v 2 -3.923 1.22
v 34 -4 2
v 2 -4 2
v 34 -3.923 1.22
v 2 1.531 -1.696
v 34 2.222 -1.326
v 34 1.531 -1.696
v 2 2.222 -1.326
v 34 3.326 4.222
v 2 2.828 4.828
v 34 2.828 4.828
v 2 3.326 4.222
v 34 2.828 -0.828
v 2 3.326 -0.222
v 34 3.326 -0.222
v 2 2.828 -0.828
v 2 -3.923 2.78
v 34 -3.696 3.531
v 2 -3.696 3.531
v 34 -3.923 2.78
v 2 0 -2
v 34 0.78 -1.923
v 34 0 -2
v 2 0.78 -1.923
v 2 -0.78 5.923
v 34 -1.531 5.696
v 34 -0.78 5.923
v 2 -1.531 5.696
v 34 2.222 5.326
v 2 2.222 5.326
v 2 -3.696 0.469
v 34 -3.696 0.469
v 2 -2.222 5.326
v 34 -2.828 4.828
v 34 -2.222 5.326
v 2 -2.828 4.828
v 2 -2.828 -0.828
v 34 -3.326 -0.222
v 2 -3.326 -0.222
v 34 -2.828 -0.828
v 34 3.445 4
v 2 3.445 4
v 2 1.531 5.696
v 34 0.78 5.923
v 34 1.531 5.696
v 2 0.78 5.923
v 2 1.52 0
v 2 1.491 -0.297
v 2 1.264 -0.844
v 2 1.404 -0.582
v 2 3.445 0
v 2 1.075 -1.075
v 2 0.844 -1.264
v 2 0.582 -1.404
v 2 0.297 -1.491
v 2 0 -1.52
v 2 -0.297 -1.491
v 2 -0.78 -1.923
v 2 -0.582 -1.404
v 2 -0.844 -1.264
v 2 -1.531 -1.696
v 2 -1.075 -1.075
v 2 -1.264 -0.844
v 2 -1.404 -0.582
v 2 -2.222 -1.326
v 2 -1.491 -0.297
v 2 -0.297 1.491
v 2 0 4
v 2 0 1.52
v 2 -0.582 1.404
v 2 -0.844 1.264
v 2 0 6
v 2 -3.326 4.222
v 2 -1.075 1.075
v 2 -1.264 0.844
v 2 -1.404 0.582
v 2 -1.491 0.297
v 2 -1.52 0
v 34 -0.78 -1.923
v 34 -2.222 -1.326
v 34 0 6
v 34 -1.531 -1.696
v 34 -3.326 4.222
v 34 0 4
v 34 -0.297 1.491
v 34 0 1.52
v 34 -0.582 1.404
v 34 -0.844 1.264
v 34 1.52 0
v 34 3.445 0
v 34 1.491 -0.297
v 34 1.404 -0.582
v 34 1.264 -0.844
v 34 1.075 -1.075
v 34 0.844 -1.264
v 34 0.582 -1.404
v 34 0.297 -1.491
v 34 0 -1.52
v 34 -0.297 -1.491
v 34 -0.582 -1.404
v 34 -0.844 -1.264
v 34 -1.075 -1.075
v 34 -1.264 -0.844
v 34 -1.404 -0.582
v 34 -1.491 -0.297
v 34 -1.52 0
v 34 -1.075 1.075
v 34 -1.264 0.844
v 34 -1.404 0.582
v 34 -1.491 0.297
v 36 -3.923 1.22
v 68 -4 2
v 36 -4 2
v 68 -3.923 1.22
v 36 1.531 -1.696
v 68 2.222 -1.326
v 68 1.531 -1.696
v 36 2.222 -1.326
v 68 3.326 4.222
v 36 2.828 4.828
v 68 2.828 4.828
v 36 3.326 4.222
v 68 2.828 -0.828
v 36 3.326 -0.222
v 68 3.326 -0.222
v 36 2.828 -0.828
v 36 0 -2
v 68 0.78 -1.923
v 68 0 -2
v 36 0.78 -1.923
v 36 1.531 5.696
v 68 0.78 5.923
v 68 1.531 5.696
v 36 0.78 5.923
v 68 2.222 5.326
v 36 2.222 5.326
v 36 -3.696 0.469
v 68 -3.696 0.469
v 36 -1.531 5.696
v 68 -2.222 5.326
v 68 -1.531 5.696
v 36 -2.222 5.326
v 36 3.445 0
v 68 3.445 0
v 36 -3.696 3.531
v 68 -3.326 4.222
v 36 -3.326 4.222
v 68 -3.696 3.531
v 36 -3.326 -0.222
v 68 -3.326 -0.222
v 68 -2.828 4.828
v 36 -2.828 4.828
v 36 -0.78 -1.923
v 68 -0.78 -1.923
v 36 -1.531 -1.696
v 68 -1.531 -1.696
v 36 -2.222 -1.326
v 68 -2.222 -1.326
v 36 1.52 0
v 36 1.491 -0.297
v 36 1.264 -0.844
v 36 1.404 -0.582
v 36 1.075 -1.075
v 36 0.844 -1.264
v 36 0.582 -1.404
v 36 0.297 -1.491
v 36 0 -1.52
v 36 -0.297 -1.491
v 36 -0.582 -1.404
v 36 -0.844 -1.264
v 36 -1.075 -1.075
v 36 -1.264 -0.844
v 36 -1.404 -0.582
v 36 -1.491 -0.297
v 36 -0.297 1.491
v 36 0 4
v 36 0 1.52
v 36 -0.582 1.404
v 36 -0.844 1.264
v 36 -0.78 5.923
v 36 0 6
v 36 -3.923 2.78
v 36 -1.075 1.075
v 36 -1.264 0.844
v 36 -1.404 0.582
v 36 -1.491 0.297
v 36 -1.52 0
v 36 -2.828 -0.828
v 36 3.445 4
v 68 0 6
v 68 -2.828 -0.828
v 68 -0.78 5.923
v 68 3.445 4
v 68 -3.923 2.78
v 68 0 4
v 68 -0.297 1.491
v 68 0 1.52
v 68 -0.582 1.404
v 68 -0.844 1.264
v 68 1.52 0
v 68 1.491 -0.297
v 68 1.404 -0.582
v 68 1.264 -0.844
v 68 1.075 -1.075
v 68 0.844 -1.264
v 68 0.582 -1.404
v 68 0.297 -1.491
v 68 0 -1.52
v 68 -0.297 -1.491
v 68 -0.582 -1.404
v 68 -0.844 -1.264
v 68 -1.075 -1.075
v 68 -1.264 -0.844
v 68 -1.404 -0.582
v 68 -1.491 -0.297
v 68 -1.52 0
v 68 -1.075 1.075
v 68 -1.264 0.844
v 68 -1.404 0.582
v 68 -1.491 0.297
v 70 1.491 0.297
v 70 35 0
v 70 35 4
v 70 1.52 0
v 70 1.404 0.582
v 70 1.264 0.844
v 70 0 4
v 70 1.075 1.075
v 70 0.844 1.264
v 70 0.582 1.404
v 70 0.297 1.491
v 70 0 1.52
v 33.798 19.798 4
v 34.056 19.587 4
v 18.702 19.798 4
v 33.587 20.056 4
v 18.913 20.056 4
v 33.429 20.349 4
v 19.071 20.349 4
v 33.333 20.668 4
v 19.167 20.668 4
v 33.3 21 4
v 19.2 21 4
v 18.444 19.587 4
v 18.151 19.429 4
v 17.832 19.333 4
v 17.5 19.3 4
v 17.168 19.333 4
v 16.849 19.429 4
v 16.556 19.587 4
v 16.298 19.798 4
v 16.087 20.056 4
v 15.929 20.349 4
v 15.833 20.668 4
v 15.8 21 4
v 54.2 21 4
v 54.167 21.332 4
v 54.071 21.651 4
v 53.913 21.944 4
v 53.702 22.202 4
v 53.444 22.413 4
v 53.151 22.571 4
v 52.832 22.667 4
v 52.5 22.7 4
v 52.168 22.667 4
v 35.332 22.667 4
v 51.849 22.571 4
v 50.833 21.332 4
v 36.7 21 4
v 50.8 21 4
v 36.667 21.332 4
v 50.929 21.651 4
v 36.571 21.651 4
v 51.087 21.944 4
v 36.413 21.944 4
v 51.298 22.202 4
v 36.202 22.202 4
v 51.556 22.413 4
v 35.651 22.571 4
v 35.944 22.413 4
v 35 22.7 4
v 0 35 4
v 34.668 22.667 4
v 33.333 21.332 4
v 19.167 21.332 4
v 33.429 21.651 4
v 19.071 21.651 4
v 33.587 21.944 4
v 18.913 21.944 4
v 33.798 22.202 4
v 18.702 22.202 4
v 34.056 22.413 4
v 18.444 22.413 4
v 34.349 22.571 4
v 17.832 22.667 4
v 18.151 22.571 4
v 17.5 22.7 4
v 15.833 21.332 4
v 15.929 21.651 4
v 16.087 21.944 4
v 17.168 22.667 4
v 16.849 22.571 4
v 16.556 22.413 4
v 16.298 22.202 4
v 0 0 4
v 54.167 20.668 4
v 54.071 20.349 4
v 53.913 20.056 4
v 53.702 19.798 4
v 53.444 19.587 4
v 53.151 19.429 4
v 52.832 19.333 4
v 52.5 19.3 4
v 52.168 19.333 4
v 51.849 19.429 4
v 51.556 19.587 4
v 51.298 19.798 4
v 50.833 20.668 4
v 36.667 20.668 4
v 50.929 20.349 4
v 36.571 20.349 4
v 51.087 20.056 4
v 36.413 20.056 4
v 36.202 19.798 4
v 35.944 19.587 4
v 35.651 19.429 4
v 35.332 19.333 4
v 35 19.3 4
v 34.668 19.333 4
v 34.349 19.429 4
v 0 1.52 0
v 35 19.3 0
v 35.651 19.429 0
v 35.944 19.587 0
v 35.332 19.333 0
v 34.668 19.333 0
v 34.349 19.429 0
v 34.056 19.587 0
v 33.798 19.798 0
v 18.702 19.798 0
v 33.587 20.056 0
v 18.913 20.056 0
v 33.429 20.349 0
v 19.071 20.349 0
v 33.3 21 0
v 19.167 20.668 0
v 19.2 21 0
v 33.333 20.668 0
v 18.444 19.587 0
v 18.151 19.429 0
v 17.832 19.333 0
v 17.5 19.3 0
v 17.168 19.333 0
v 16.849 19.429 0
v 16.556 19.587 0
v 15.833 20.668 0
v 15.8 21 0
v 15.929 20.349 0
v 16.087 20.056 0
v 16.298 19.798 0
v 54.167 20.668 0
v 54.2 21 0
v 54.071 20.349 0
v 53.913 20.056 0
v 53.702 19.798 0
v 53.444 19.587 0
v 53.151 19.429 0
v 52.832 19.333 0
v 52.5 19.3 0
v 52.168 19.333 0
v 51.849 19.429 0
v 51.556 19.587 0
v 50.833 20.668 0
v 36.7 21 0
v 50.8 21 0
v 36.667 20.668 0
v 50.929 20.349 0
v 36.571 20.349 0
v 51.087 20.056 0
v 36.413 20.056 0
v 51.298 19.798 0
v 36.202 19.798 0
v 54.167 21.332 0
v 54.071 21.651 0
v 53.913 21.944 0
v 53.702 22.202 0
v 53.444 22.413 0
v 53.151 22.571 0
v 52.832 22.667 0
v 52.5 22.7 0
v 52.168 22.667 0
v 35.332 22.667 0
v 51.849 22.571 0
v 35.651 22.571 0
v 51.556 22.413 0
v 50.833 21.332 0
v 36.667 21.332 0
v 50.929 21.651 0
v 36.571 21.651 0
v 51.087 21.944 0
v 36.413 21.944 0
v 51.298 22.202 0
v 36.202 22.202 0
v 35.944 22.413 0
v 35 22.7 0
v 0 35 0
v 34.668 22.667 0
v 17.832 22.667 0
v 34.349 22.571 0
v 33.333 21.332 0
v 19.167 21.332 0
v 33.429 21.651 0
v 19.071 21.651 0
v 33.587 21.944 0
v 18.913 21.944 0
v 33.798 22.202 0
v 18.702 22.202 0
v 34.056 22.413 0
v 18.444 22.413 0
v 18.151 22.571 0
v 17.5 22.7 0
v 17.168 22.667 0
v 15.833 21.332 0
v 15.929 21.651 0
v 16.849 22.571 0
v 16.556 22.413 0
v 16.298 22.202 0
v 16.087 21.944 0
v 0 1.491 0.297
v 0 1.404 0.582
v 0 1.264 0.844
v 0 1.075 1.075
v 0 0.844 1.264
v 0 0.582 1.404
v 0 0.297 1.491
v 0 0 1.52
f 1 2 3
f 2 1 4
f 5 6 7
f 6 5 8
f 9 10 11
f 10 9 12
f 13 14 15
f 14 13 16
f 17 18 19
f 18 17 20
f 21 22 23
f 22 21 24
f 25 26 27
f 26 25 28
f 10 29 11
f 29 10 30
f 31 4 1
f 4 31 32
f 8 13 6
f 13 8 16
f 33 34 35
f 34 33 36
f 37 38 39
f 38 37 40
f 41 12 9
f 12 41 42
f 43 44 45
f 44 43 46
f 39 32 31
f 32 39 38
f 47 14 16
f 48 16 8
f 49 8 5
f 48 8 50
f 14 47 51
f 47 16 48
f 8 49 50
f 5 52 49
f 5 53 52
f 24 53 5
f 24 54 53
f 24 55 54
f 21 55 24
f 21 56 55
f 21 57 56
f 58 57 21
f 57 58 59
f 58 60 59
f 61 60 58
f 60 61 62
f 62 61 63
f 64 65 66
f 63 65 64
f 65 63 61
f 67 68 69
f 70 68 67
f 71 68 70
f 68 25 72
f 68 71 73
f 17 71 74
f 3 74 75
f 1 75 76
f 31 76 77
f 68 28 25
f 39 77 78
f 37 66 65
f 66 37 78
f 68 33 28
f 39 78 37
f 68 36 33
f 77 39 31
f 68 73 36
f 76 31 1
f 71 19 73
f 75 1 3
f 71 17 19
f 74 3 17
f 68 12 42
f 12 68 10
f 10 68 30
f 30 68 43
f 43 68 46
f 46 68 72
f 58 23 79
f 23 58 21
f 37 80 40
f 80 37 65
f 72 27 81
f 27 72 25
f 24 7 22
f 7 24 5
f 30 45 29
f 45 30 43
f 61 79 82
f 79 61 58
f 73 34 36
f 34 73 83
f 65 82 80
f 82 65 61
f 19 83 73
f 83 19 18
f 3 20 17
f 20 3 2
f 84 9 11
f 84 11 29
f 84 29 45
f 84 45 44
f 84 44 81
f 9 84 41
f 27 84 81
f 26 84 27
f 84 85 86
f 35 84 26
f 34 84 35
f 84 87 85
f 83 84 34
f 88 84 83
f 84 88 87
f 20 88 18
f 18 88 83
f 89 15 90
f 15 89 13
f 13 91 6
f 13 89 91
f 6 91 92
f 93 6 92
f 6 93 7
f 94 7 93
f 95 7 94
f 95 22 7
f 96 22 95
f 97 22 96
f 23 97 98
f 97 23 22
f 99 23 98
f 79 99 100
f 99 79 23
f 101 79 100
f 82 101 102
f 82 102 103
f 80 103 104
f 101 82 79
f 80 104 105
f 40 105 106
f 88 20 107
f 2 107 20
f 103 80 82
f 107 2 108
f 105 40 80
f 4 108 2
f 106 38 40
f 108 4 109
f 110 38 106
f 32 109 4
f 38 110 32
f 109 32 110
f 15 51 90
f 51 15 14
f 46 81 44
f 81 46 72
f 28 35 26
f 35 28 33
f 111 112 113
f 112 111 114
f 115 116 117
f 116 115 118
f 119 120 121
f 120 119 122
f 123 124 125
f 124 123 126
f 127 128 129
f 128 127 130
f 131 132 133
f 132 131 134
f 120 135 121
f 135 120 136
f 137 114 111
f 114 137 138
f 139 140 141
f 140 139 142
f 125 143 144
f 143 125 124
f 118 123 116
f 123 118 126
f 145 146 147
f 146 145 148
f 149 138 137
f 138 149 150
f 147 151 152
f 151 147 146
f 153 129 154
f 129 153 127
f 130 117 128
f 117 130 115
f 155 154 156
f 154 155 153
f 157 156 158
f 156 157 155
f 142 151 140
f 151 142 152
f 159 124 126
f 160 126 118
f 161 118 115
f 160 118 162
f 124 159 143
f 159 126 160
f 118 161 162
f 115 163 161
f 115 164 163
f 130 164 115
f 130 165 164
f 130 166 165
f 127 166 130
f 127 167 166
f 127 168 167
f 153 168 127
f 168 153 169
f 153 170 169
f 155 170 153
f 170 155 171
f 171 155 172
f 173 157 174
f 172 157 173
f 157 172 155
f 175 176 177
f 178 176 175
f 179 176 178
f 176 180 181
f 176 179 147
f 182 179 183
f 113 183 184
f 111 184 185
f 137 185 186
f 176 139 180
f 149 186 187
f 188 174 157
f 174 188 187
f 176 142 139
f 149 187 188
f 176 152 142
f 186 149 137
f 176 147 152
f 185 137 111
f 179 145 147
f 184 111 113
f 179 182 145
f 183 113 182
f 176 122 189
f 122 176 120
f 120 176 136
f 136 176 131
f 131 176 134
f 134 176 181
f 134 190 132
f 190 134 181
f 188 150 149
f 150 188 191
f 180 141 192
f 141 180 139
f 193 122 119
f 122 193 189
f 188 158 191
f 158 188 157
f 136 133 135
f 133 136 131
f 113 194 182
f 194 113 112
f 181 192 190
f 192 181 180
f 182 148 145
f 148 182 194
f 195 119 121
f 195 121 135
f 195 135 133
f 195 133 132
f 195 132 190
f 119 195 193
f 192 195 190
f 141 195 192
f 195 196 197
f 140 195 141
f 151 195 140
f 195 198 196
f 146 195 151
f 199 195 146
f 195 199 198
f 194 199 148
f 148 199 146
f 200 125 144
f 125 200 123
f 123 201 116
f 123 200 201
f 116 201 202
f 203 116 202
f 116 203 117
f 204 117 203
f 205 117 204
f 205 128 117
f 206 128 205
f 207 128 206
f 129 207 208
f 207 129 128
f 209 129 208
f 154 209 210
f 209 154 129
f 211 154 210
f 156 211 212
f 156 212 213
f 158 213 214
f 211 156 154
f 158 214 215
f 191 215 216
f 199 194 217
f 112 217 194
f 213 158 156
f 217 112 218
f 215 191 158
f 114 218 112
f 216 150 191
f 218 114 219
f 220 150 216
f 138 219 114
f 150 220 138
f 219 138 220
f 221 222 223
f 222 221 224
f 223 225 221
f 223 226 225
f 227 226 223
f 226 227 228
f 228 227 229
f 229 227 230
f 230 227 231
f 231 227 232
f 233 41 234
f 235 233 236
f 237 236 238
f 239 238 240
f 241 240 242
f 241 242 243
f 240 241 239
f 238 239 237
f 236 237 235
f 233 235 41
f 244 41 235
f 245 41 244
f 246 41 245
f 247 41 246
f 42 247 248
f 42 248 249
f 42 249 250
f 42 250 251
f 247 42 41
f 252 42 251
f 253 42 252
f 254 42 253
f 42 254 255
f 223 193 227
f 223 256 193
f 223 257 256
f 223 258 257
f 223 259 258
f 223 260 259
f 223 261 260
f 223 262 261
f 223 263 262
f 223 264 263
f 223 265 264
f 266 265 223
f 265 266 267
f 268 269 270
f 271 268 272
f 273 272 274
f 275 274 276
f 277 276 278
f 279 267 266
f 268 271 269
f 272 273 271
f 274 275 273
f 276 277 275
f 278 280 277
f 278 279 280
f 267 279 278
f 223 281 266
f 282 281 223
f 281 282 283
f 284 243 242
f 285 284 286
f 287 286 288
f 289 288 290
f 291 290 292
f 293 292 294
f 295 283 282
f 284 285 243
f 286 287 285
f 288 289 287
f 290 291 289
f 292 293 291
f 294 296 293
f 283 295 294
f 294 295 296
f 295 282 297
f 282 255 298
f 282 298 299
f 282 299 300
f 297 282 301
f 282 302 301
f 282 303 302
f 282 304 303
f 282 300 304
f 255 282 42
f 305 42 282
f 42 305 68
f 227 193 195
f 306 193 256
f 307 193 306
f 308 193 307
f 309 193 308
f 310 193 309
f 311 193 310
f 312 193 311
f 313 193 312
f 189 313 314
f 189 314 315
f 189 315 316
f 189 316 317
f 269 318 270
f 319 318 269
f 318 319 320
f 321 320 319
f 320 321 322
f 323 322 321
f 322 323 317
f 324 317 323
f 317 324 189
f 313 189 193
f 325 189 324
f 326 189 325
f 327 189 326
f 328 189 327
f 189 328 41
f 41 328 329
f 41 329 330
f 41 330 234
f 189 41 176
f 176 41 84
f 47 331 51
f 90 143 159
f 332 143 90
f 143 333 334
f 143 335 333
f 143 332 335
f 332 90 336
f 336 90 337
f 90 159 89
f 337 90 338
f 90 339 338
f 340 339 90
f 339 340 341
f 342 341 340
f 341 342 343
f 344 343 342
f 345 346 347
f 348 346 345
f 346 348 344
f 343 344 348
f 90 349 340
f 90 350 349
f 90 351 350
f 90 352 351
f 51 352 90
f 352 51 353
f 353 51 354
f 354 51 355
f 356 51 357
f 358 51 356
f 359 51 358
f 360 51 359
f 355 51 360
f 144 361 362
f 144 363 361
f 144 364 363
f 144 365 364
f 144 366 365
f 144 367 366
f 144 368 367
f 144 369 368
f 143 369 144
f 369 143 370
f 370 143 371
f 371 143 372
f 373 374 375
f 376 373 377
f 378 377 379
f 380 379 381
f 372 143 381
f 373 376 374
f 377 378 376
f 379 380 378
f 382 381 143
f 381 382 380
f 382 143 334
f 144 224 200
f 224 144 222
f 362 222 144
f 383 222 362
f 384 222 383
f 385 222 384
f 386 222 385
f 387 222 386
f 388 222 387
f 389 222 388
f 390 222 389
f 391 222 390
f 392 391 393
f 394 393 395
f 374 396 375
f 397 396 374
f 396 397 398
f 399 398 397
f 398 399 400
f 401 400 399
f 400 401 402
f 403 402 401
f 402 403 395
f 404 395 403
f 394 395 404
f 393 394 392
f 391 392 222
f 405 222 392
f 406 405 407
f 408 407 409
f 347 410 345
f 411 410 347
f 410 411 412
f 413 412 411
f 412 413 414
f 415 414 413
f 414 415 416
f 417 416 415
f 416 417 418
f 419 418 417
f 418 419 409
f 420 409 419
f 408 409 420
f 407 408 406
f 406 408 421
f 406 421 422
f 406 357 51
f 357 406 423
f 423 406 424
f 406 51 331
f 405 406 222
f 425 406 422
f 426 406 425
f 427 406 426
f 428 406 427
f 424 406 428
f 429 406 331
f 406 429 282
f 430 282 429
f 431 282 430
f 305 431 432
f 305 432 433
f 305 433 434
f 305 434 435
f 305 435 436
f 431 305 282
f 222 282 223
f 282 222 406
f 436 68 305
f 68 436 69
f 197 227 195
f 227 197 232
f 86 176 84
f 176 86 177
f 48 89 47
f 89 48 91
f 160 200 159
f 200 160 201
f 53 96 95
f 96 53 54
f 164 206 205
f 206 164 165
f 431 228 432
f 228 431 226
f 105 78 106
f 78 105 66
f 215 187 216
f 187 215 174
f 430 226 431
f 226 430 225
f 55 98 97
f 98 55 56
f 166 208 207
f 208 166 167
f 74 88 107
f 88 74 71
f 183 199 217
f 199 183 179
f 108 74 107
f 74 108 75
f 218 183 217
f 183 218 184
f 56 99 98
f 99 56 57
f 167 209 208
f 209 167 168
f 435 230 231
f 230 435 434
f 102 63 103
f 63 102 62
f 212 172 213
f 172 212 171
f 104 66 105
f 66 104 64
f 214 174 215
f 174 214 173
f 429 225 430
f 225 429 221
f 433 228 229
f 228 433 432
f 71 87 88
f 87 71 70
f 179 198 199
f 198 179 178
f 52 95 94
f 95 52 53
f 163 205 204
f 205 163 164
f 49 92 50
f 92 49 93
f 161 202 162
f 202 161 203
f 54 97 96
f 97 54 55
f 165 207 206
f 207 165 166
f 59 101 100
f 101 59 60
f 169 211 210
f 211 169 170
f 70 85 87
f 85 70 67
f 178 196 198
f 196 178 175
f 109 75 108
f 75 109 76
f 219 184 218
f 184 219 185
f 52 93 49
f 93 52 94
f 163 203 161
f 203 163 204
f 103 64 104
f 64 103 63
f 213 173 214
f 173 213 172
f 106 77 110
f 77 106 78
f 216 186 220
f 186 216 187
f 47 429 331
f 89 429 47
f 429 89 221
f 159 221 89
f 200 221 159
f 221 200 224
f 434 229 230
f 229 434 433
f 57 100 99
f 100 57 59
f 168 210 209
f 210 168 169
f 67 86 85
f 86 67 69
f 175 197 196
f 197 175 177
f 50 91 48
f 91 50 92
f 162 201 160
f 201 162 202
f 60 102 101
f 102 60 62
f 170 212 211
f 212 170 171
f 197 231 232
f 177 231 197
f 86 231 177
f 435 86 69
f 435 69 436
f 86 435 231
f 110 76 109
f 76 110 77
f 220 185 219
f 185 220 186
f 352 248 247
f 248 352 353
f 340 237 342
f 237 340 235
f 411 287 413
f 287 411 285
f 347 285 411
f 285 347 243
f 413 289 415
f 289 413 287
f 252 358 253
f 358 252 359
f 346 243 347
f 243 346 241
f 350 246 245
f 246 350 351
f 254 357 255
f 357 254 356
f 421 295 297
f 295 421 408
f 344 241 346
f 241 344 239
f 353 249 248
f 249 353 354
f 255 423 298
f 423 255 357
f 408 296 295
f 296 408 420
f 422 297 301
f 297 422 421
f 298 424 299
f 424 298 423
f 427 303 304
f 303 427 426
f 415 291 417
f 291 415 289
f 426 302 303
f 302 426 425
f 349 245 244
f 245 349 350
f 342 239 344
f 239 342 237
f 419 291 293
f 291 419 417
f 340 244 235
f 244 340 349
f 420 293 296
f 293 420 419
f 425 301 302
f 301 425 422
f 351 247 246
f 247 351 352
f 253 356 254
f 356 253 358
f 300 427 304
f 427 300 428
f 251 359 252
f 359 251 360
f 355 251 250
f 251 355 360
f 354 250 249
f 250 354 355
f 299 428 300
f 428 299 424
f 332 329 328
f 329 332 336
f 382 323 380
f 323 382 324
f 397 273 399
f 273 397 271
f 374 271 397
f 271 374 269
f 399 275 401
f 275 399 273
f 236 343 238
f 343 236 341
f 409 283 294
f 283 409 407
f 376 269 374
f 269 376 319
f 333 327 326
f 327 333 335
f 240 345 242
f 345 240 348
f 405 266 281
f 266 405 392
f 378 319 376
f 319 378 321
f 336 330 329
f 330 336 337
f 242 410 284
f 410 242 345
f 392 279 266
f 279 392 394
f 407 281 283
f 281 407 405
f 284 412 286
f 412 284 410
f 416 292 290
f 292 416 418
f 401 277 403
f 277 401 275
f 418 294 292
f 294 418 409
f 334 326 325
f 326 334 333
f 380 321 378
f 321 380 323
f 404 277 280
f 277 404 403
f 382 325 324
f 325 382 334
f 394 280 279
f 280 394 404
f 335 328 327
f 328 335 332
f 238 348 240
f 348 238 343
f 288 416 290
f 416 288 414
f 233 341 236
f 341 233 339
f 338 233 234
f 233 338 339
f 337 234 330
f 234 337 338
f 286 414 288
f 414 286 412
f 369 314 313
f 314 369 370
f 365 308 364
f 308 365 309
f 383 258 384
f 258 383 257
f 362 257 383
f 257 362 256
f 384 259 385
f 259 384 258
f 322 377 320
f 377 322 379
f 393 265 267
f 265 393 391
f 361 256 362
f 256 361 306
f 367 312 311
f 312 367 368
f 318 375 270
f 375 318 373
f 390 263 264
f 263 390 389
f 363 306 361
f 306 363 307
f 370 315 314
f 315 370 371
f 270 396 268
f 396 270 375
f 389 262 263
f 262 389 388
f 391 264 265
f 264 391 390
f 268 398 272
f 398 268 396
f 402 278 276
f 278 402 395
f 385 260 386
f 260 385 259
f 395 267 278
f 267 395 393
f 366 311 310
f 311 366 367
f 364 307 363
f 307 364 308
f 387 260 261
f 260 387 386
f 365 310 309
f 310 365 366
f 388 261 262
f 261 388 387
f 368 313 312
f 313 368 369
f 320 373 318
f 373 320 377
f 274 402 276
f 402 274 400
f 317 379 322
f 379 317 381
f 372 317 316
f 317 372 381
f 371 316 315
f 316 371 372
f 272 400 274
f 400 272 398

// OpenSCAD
$fn = 32;

// ----------------------------------------------------------------------
// Hinge leaf: 70 x 39 x 8 mm
// ----------------------------------------------------------------------

// --- parameters (mm) ---
tab_len = 70;             // leaf length, X
tab_w = 35;               // leaf width, Y
tab_t = 4;                // leaf thickness
ring_d = 8;               // knuckle diameter
ring_w = 32;              // knuckle width
knuckle_n = 2;            // number of knuckles
pin_d = 3.04;             // pin bore
gap = 2;                  // gap between the knuckles
screw_d = 3.4;            // screw clearance

module leaf() {
  cube([tab_len, tab_w, tab_t]);
}

module knuckles() {
  /* barrels sit on the leaf edge, the pin axis at half the leaf thickness */
  for (i = [0 : knuckle_n - 1])
    translate([gap + i * (ring_w + gap), 0, tab_t * 0.5])
      rotate([0, 90, 0]) cylinder(h = ring_w, d = ring_d);
}

difference() {
  union() {
    leaf();
    knuckles();
  }
  rotate([0, 90, 0]) translate([0, 0, -1])
    cylinder(h = tab_len + 2, d = pin_d);
  translate([17.5, tab_w * 0.6, -1]) cylinder(h = tab_t + 2, d = screw_d);
  translate([35, tab_w * 0.6, -1]) cylinder(h = tab_t + 2, d = screw_d);
  translate([52.5, tab_w * 0.6, -1]) cylinder(h = tab_t + 2, d = screw_d);
}
